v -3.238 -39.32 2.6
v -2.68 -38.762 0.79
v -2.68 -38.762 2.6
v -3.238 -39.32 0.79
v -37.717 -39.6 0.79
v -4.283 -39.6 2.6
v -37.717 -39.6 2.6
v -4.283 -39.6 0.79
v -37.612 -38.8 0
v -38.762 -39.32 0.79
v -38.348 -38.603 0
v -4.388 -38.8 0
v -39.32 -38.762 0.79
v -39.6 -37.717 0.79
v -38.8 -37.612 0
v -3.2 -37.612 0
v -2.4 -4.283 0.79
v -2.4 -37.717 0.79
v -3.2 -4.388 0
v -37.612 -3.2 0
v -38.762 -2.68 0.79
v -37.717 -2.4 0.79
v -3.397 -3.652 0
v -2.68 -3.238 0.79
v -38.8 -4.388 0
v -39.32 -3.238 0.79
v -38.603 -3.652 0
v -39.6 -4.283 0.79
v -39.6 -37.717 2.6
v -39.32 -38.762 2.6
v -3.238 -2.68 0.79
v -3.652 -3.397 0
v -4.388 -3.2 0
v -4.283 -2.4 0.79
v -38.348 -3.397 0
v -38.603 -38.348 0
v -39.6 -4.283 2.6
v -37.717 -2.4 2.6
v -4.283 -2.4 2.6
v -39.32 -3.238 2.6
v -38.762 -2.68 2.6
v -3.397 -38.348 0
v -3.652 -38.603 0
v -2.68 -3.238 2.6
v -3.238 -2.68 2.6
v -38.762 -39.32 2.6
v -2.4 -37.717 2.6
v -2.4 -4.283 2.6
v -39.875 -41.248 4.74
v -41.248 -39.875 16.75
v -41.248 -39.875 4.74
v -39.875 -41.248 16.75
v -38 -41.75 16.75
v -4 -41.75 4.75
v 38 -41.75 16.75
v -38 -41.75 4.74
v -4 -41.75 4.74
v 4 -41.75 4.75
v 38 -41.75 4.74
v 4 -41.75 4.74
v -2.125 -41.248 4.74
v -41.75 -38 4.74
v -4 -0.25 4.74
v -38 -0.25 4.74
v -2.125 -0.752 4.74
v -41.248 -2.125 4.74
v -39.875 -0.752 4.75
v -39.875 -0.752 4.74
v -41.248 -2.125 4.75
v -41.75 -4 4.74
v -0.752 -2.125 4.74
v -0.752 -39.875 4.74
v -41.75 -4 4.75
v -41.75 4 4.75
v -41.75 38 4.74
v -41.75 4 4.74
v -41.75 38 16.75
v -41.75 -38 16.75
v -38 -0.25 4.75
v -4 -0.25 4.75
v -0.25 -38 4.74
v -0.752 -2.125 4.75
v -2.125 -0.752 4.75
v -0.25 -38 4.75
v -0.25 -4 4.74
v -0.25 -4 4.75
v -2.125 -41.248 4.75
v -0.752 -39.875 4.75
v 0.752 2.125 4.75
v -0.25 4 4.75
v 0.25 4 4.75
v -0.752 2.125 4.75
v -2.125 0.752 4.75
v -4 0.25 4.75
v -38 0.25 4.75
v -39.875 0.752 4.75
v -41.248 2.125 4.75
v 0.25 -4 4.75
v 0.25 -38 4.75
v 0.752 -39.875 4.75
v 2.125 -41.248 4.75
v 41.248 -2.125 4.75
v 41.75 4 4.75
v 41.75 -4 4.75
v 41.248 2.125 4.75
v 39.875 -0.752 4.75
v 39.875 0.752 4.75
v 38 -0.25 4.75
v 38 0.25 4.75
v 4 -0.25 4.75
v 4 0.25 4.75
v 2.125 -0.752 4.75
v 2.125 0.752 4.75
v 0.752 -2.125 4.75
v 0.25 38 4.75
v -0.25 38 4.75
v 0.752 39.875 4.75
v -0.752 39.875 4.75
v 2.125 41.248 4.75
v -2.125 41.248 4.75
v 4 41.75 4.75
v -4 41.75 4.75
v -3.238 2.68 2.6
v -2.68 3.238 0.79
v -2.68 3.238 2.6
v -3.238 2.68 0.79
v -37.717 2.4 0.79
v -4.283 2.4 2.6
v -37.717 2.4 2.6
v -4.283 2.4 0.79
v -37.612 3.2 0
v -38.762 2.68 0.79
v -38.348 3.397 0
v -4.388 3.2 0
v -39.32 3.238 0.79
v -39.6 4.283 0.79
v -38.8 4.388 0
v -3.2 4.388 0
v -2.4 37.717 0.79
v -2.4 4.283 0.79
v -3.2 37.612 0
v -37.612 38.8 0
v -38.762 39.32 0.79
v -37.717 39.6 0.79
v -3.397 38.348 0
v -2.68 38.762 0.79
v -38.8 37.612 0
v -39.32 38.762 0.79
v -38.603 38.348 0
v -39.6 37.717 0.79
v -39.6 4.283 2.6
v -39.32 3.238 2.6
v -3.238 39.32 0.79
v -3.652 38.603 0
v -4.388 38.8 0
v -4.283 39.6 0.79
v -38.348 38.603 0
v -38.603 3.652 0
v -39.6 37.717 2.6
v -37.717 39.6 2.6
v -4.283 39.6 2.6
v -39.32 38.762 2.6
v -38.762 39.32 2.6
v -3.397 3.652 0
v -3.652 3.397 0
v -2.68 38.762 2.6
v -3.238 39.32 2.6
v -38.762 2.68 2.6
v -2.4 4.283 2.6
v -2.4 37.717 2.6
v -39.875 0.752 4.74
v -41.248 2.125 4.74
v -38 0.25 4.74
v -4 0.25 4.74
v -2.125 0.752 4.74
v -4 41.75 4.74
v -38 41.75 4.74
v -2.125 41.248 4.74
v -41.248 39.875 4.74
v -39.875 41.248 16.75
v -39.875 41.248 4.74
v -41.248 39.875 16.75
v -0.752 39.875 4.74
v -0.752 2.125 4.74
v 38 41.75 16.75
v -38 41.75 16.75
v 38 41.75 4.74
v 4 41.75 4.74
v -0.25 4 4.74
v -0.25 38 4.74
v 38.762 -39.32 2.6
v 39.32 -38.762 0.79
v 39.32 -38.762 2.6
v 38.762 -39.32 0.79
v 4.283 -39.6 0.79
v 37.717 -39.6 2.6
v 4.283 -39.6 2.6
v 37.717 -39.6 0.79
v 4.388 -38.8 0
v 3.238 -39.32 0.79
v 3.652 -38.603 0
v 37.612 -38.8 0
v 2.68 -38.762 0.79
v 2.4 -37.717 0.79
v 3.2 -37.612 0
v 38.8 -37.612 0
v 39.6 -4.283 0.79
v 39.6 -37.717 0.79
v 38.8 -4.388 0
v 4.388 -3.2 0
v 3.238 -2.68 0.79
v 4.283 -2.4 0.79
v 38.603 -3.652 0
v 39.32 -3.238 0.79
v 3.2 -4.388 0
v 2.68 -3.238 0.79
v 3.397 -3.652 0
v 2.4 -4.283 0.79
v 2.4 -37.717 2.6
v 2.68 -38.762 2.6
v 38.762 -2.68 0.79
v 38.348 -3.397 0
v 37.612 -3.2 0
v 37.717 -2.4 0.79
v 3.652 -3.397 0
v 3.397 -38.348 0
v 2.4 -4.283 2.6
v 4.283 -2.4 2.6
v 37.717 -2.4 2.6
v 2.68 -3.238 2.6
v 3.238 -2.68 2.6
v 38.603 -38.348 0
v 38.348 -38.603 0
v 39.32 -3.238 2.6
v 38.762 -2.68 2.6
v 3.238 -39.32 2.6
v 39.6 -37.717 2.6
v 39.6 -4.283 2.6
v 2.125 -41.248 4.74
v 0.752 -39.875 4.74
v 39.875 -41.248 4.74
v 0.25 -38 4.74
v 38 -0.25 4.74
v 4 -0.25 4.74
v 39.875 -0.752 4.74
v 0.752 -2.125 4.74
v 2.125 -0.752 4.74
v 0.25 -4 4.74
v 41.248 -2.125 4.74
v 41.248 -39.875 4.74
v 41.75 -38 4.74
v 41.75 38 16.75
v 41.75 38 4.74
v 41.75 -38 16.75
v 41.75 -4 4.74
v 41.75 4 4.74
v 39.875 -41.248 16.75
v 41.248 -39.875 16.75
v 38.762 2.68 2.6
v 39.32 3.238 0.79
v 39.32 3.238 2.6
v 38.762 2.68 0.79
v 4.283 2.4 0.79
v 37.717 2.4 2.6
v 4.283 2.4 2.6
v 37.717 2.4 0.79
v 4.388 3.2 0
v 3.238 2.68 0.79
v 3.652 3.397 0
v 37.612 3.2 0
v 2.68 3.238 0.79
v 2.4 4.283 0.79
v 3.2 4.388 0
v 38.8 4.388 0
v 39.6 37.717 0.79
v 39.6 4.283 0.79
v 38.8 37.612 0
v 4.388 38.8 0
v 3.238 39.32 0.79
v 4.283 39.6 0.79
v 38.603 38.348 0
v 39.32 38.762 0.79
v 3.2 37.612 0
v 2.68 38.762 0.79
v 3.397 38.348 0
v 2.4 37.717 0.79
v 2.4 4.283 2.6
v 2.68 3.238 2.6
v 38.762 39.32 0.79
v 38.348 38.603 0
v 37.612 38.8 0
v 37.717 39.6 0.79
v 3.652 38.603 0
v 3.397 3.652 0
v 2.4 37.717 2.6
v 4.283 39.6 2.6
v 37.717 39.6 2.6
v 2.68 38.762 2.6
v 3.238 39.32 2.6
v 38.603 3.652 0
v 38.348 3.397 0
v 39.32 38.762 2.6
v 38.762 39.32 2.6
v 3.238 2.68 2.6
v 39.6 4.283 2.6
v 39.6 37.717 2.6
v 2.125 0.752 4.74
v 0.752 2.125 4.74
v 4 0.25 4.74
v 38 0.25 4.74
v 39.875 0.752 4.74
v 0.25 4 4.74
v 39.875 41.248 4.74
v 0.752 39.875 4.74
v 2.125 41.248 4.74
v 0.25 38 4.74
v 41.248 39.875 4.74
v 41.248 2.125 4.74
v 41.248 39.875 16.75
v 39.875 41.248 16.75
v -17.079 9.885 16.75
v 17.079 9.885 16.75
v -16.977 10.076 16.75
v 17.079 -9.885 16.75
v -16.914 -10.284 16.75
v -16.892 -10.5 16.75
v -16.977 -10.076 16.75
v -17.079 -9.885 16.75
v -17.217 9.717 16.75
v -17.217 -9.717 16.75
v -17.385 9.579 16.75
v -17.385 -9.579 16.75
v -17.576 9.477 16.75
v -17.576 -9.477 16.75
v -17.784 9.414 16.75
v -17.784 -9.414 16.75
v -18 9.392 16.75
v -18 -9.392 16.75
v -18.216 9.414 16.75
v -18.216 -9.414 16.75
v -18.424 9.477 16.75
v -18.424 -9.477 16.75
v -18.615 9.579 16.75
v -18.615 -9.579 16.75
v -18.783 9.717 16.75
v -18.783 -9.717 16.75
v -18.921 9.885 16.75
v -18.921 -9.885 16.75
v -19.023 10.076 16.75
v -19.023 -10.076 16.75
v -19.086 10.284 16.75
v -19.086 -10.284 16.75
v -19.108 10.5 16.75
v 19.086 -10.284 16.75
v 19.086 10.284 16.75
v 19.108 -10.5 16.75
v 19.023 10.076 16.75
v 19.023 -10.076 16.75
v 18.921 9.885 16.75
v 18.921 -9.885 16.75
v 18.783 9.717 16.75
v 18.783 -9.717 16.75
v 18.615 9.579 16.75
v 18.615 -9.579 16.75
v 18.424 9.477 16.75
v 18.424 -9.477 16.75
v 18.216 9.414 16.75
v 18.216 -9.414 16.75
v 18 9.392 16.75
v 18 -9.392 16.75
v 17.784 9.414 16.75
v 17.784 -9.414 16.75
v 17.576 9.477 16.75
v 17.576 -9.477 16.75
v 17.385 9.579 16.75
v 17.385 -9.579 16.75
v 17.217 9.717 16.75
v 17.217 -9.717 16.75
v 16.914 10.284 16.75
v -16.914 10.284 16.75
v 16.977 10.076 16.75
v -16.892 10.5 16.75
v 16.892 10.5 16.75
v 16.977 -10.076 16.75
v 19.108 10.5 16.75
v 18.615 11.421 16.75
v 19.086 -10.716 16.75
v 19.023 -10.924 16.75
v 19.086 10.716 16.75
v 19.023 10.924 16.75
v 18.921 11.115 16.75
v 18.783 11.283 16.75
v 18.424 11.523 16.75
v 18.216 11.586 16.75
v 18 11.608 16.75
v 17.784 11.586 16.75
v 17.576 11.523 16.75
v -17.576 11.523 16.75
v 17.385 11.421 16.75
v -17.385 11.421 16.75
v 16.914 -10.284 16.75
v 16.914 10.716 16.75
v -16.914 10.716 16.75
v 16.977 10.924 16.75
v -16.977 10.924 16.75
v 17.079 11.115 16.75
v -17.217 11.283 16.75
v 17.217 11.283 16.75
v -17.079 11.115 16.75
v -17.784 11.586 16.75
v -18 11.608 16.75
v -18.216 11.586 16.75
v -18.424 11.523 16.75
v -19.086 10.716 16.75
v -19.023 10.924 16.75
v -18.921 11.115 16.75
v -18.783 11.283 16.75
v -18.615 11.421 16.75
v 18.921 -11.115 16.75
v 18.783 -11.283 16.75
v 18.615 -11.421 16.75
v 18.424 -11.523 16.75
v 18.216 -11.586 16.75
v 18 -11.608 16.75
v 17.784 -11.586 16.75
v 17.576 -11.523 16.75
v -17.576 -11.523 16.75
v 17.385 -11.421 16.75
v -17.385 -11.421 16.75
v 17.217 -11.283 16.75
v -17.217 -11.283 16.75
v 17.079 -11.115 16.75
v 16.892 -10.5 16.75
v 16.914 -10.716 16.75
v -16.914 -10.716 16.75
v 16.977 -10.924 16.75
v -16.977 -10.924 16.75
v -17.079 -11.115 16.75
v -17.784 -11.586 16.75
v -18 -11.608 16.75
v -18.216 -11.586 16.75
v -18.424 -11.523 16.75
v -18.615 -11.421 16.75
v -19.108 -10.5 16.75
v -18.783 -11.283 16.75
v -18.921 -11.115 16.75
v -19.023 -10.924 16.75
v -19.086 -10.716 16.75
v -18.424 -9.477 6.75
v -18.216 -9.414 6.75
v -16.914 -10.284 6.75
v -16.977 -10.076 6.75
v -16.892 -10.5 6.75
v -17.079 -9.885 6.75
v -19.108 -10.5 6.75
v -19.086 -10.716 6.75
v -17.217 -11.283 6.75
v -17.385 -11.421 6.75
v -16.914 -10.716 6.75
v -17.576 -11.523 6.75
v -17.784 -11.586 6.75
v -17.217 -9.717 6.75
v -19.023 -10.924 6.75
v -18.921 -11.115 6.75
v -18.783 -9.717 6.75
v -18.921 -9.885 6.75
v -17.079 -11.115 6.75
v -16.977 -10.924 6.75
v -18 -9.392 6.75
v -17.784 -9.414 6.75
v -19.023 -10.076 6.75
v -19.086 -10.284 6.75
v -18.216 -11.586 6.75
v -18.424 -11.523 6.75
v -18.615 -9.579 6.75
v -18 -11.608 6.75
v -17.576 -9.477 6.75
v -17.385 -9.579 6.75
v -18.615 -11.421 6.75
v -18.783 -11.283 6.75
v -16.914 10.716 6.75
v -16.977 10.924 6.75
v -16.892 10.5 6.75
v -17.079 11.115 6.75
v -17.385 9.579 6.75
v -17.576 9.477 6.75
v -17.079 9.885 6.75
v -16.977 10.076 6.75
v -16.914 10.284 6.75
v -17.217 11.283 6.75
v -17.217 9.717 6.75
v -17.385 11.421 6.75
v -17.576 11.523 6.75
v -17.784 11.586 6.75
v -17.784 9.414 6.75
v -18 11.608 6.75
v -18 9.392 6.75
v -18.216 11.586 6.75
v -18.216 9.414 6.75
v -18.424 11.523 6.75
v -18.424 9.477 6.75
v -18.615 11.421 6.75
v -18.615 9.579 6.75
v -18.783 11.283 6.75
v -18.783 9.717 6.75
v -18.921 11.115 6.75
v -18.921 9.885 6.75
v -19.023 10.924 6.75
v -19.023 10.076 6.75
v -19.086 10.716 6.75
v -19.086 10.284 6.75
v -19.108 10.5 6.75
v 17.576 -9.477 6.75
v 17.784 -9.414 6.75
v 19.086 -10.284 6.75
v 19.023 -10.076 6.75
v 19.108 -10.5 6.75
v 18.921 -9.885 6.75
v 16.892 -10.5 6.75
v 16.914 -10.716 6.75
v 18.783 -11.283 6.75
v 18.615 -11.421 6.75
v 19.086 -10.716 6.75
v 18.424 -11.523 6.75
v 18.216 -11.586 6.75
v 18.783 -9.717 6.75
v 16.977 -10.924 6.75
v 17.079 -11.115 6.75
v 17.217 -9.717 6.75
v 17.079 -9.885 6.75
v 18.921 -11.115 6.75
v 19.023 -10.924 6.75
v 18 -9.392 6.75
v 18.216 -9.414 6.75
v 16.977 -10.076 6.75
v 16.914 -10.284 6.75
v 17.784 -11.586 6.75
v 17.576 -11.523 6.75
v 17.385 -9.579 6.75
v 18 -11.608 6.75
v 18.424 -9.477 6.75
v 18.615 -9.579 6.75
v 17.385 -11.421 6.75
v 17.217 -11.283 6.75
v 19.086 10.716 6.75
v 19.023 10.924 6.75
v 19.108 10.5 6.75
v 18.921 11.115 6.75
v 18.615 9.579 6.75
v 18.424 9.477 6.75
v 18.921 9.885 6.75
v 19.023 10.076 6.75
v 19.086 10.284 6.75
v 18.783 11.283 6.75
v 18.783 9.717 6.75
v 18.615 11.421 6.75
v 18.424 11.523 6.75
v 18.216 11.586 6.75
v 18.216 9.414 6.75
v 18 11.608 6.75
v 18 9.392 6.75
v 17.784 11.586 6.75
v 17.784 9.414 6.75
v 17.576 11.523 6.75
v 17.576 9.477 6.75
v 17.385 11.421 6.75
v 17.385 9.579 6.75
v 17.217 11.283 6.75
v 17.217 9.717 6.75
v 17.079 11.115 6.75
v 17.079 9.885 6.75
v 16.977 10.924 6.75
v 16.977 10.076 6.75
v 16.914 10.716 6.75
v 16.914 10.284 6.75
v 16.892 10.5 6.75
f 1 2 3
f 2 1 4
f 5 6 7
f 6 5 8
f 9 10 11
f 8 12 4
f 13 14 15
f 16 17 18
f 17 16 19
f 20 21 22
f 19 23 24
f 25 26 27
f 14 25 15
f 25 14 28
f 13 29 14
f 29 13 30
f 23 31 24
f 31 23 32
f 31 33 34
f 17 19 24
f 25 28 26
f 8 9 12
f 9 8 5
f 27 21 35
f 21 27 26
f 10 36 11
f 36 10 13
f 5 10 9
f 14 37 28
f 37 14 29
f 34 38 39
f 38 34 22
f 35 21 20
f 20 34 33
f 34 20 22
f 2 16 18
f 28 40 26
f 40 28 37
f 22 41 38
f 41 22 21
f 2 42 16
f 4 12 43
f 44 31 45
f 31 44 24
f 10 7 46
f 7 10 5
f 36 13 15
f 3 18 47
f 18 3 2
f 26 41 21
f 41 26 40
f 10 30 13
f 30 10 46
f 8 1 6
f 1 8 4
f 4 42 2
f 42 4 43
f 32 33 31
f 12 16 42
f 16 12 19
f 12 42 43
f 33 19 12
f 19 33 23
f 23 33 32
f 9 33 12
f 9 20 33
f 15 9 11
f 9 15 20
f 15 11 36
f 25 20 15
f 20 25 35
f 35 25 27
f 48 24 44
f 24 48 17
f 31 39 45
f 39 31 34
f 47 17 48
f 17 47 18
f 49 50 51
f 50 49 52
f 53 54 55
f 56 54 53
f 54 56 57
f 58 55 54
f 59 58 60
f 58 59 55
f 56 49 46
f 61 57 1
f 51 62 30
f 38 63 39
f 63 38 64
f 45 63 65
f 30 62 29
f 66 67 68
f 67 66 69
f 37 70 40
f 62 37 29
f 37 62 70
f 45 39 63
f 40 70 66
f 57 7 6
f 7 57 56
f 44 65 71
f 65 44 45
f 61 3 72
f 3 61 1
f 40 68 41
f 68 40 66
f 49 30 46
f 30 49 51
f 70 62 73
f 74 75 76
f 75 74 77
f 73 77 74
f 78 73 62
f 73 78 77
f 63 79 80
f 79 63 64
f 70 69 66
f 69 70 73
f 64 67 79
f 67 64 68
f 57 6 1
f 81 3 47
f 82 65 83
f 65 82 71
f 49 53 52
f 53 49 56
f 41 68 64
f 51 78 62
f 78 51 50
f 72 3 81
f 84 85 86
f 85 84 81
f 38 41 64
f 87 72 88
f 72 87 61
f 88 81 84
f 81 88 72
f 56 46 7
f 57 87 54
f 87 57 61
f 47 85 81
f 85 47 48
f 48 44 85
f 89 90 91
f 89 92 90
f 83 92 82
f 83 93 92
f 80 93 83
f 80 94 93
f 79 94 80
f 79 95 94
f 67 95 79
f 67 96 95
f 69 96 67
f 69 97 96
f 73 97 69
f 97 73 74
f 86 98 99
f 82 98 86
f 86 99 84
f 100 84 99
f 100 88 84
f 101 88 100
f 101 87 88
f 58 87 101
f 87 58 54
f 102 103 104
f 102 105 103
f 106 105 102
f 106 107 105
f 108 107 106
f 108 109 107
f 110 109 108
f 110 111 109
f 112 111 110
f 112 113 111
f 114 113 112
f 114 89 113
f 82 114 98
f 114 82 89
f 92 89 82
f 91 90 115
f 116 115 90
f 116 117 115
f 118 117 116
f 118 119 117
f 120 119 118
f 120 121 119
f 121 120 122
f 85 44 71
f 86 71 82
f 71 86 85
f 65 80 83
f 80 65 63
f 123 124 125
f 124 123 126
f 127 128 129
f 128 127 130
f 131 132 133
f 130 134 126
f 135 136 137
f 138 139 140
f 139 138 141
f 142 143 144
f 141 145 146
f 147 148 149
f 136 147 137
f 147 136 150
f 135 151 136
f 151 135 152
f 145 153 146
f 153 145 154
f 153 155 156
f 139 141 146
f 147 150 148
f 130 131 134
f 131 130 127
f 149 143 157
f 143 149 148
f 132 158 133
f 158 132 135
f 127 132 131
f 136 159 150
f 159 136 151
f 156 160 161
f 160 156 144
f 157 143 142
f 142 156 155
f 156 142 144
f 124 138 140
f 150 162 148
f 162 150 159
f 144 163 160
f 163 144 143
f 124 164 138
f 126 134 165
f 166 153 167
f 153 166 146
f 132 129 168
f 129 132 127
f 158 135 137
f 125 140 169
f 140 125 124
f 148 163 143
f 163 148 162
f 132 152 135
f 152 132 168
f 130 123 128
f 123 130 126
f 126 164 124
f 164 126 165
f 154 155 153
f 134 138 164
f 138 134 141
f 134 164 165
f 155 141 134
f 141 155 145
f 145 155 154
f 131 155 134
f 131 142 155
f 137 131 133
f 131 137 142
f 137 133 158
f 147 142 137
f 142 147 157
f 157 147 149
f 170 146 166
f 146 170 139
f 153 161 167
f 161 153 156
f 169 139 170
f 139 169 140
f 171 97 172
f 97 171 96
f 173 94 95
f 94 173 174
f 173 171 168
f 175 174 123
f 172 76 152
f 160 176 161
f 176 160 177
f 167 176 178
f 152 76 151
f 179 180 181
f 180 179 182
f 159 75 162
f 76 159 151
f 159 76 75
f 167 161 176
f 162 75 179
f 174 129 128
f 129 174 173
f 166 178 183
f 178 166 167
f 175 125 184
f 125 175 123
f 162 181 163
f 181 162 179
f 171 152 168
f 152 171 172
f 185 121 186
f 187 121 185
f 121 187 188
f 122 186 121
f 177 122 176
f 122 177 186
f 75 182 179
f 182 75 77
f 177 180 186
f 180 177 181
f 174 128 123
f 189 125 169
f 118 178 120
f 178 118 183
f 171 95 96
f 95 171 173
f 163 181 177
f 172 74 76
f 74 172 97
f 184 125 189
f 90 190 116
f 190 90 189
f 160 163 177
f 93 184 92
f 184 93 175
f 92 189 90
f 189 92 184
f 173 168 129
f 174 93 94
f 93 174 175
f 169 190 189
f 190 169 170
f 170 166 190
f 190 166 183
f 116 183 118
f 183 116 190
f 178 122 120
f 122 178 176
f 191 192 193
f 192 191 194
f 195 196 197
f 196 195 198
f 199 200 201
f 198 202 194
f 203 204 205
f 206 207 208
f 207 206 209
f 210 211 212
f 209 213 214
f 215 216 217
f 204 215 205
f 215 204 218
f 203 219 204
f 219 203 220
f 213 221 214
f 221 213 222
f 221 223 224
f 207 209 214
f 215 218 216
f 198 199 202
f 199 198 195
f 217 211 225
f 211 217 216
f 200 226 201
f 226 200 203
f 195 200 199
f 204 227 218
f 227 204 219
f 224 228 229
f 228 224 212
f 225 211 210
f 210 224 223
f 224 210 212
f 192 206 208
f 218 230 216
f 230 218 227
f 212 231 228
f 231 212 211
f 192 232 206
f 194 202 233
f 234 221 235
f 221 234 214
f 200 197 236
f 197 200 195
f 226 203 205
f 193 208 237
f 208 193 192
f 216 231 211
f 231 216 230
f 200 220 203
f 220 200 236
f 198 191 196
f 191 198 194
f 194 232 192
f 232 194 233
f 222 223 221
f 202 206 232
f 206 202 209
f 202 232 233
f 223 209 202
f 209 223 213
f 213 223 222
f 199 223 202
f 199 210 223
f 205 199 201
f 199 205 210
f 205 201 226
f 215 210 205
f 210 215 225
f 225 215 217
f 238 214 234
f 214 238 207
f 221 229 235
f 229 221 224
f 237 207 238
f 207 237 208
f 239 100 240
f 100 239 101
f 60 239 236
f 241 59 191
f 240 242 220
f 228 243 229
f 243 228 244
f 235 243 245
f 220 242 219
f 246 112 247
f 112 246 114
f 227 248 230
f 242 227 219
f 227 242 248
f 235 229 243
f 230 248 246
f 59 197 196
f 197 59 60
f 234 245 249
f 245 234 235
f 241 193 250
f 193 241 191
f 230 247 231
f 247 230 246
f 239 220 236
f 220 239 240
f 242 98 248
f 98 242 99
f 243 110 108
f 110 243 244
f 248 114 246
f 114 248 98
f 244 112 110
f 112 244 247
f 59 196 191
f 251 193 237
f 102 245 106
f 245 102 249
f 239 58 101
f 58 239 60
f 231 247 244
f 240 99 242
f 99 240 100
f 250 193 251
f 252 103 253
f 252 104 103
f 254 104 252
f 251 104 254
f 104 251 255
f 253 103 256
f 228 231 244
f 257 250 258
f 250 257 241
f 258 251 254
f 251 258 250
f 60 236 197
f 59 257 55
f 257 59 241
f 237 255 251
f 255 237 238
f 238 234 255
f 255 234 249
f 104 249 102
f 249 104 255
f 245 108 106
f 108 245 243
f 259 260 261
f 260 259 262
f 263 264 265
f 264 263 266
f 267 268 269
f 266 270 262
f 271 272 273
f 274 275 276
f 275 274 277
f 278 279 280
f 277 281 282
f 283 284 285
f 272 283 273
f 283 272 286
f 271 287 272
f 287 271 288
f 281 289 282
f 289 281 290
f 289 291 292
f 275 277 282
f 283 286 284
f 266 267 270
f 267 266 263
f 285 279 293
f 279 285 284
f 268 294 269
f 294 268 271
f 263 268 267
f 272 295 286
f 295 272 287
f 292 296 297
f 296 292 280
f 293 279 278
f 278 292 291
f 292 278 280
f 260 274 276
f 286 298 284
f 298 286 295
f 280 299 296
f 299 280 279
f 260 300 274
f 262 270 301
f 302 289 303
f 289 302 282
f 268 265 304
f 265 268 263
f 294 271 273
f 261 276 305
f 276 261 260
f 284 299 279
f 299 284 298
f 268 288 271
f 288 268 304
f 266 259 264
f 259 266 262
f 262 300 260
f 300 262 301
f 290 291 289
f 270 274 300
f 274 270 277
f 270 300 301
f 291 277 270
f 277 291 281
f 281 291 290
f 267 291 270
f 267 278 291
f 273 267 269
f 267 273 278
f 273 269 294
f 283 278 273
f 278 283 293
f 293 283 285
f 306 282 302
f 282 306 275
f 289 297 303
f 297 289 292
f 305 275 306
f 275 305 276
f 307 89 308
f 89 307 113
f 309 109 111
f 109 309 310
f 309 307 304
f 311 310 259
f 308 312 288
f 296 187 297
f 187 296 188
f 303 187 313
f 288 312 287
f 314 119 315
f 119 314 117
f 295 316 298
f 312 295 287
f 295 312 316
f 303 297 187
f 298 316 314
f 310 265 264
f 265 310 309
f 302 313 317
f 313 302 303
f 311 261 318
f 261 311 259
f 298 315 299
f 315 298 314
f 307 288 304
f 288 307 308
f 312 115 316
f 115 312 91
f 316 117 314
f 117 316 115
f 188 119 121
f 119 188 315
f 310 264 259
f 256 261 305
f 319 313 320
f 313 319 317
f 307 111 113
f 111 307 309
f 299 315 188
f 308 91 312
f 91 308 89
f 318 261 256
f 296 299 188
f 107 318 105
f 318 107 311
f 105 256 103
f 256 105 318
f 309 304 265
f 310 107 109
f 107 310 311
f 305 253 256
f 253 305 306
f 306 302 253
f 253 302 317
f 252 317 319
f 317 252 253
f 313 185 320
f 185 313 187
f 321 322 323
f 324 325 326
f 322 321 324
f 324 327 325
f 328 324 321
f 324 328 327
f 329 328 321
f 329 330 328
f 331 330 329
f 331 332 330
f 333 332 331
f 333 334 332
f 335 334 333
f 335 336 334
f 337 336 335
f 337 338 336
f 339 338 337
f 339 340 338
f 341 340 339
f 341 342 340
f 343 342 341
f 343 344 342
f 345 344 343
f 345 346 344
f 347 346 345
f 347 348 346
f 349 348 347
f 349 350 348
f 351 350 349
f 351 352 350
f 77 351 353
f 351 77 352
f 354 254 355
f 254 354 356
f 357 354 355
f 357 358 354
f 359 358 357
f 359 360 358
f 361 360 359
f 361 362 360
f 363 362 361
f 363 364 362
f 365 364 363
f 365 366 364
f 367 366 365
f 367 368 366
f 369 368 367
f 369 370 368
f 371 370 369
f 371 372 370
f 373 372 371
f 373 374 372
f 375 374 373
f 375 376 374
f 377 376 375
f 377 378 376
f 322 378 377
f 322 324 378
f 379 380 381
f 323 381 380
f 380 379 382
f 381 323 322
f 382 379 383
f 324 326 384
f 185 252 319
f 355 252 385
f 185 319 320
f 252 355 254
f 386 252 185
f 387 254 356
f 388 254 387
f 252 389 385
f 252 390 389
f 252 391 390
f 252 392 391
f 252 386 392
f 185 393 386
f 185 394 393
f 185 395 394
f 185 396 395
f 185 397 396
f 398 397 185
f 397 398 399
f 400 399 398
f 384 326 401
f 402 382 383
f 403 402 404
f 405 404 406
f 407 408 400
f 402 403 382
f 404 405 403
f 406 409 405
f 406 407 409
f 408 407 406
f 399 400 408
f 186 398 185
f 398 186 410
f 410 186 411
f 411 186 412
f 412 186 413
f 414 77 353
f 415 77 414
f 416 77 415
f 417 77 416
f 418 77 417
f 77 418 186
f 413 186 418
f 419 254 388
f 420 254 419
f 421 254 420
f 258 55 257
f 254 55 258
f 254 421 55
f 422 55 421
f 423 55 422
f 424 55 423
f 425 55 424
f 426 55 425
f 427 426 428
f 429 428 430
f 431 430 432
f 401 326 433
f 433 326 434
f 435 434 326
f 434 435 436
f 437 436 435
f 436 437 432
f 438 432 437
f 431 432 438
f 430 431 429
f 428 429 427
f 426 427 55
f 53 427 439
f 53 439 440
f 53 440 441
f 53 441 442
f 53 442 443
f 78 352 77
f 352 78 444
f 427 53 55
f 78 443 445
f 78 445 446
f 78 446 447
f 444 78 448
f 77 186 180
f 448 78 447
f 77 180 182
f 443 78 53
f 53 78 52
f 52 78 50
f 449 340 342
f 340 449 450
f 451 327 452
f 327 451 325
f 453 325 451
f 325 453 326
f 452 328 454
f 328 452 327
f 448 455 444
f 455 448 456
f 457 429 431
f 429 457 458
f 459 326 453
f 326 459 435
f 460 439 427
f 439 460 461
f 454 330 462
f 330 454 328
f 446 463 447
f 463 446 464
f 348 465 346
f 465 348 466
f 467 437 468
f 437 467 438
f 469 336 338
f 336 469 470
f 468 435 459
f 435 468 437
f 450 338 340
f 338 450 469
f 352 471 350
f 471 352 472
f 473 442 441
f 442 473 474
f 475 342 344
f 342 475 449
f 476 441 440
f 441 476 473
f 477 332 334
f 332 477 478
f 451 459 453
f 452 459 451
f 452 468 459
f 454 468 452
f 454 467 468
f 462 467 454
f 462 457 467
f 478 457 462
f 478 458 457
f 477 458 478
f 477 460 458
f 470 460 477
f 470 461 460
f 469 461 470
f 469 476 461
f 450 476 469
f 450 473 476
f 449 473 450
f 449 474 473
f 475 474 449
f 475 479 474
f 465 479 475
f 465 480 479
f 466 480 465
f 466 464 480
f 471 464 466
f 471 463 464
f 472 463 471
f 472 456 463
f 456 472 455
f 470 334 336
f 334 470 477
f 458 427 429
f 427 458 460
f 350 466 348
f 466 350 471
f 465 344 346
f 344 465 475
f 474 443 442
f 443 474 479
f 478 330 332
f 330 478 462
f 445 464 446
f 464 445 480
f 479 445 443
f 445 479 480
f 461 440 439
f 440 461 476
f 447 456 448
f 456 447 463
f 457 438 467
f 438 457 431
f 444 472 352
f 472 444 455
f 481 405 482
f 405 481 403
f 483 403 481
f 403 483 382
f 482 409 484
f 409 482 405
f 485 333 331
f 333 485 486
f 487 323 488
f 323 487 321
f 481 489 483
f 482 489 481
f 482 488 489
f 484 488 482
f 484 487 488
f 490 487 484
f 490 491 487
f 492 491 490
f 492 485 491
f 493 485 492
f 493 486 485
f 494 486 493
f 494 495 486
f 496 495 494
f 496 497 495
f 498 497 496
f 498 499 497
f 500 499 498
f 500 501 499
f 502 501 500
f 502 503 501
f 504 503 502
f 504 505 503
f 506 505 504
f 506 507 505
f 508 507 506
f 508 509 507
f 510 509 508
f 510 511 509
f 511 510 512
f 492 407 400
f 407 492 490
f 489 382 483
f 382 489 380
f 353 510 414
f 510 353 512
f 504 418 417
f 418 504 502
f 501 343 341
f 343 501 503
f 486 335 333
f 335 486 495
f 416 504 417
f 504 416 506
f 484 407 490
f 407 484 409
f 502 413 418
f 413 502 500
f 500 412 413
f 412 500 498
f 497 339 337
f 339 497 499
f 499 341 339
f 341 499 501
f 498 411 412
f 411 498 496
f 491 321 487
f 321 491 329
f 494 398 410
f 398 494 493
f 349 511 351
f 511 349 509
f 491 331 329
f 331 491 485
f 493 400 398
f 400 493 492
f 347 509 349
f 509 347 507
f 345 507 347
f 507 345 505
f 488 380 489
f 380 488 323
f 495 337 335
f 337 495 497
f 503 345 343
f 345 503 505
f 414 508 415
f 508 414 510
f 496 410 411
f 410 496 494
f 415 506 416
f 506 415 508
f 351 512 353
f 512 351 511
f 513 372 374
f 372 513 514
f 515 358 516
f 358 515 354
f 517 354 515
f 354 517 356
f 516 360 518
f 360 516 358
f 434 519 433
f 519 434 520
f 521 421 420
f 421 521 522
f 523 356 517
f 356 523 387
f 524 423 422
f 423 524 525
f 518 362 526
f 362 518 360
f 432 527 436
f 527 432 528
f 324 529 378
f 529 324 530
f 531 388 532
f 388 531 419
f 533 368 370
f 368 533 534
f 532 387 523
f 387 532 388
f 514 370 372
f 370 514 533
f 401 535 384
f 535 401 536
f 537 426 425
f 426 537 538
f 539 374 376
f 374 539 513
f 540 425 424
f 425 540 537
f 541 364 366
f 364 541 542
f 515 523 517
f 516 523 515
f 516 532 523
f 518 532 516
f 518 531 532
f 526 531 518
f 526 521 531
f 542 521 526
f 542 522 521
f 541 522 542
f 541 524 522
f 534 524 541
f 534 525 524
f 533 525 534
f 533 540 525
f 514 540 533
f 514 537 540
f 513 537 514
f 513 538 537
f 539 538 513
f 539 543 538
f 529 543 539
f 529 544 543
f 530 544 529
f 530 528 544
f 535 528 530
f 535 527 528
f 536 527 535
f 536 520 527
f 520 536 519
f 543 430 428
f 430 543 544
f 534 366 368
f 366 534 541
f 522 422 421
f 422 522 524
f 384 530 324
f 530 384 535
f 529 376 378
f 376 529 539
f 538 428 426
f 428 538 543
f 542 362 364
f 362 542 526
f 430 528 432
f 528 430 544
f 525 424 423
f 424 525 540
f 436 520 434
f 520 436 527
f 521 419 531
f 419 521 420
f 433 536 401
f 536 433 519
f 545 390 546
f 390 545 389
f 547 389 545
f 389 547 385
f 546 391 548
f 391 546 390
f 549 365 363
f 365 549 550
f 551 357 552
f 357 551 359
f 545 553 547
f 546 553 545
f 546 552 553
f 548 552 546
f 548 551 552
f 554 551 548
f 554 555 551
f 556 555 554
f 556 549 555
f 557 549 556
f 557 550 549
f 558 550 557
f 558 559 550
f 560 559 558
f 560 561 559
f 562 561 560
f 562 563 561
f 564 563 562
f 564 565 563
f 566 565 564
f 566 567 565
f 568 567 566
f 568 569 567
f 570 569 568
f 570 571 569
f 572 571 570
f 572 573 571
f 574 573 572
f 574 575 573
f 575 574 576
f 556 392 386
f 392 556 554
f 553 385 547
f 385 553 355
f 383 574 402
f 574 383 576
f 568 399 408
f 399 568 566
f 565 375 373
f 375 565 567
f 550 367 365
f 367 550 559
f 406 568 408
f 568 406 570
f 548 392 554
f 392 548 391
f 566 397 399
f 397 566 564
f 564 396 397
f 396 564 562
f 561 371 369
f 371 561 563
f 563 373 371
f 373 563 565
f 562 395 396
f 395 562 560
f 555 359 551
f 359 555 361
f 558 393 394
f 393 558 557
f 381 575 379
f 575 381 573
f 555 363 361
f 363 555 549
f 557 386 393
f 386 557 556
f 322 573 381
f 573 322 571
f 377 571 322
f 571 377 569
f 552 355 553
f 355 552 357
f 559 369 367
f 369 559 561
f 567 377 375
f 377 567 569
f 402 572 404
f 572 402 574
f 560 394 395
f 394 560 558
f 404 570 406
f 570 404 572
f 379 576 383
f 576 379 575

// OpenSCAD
// plate_heat_gun — 2×2 Gridfinity plate that the heat gun's magnetic bracket
// screws down onto.
//
// HOW YOU USE IT:
//   The plate latches into the desk grid. The magnetic bracket sits on top and
//   four screws go down through it into the bosses below. The gun then parks on
//   the bracket's magnet as usual, and the whole assembly comes off the grid as
//   one piece if you ever move it.
//
// WHY 2×2 AND NOT 2×1. The hole pattern is only 36 × 21, which a 2×1 would take.
// But Clickfinity holds about 12.2 N per cell: a 2×1 is ~24 N (2.5 kgf) and a 2×2
// is ~49 N (5 kgf). Pulling a heat gun off a magnetic bracket beats 2.5 kgf
// easily, and then the plate lifts with the gun. Four cells, not two.
//
// SCREW DIAMETER IS MEASURED. SCREW_OD = 2.84 is the thread outside diameter off
// calipers; the pilot is derived from it at 78%, deliberately undersized so a
// self-tapper cuts its own thread rather than stripping or splitting the boss.
//
// ⚠️ SCREW LENGTH IS NOT. SCREW_L = 10.0 is a guess — nobody has measured how far
// these screws actually protrude behind the bracket. It only fails in one
// direction, but it fails silently: if the screws are LONGER than 10 mm they
// bottom out in the blind hole and the bracket never pulls tight against the
// deck, which feels like a loose bracket rather than a too-short hole. Measure
// the shank behind the bracket flange and set SCREW_L to that plus 2 mm; DECK
// has 12 mm to give and asserts before anything breaks through.
//
// PRINT: as emitted, feet down. No supports — the blind holes are vertical.
//
// SPDX-License-Identifier: CC-BY-NC-4.0
// Copyright (c) 2026 Aaron Cupp
include <../lib/gridfinity.scad>

/* [Bracket] */
HOLE_X  = 36.0;   // measured 2026-08-20, centre to centre — a true rectangle
HOLE_Y  = 21.0;   // measured, centre to centre

/* [Screws] */
// Store the MEASURED screw, derive the hole. A self-tapper cuts its own thread,
// so the pilot is deliberately smaller than the screw — around 75-80% of the
// thread OD in PETG. Too big and it strips, too small and it splits the boss.
// An earlier version had the pilot at 2.5 against a 2.84 screw: 88% of OD, which
// would have stripped.
SCREW_OD  = 2.84;   // measured 2026-08-20 — thread outside diameter
PILOT_PCT = 0.78;   // [0.70:0.01:0.85] of OD
SCREW_D   = SCREW_OD * PILOT_PCT;
SCREW_L = 10.0;   // [6:1:20] ⚠️ GUESS — screw LENGTH was never measured. See header.

/* [Plate] */
DECK    = 12.0;   // [8:0.5:25] solid material above the foot. Must exceed SCREW_L
                  //   so the screw never breaks through into the baseplate socket.

H = BIN_BASE_H + DECK;

assert(DECK > SCREW_L + 1.5, "Screw would break through the underside of the deck.");
assert(HOLE_X + 3*SCREW_D < 2*GF - 0.5, "Hole pattern too wide for a 2x2.");
echo(str("plate ", 2*GF - 0.5, " square x ", H, " tall; ", SCREW_OD,
         " screw -> ", SCREW_D, " pilot, ", SCREW_L, " deep; holes at +/-",
         HOLE_X/2, ", +/-", HOLE_Y/2));

difference() {
    bin_blank(2, 2, H);
    for (sx = [-1, 1], sy = [-1, 1])
        translate([sx*HOLE_X/2, sy*HOLE_Y/2, H - SCREW_L])
            cylinder(d = SCREW_D, h = SCREW_L + 0.1, $fn = 32);
}
